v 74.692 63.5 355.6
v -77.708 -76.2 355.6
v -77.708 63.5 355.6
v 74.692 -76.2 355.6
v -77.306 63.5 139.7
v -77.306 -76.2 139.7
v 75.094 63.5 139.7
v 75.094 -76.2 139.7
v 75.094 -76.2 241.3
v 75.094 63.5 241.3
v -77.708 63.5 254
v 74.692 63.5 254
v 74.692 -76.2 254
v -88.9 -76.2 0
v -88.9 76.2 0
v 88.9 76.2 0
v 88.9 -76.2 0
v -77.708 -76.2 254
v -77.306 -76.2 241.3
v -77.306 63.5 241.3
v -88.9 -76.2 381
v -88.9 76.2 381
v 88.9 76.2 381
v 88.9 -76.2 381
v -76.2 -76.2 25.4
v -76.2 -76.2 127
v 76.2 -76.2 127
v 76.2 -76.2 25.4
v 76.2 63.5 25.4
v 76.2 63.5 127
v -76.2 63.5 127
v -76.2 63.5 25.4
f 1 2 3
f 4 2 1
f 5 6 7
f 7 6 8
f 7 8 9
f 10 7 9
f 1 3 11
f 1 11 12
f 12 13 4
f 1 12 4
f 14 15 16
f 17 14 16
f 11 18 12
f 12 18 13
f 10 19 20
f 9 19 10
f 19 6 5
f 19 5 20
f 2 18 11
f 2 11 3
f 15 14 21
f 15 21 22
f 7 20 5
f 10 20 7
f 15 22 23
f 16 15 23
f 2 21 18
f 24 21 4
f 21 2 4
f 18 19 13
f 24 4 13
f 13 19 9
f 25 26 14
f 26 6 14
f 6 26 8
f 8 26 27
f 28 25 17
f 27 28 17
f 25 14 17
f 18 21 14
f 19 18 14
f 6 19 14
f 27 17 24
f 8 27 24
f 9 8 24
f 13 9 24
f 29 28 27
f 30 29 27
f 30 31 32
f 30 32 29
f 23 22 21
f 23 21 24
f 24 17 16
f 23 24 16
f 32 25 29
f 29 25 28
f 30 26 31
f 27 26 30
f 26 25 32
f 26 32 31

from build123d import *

# Parameters (mm, degrees)
F0_W     = 177.8
F0_H     = 152.4
F1_DEPTH = 381
F2_W     = 152.4
F2_H     = 101.6
F3_DEPTH = 139.7
F4_W     = 152.4
F4_H     = 101.6
F6_DEPTH = 139.7
F5_W     = 152.4
F5_H     = 101.6
F7_DEPTH = 139.7


with BuildPart() as f1:
    # F0 (on Top) → F1 (new body)
    with BuildSketch(Plane.XY):
        Rectangle(F0_W, F0_H)
    extrude(amount=F1_DEPTH)

    # F2 (on face) → F3 (cut)
    with BuildSketch(Plane.XZ.offset(76.2)):
        with Locations((-1.507785, 304.8)):
            Rectangle(F2_W, F2_H)
    extrude(amount=-F3_DEPTH, mode=Mode.SUBTRACT)

    # F4 (on face) → F6 (cut)
    with BuildSketch(Plane.XZ.offset(76.2)):
        with Locations((-1.10613, 190.5)):
            Rectangle(F4_W, F4_H)
    extrude(amount=-F6_DEPTH, mode=Mode.SUBTRACT)

    # F5 (on face) → F7 (cut)
    with BuildSketch(Plane.XZ.offset(76.2)):
        with Locations((0, 76.2)):
            Rectangle(F5_W, F5_H)
    extrude(amount=-F7_DEPTH, mode=Mode.SUBTRACT)


solid = f1.part
